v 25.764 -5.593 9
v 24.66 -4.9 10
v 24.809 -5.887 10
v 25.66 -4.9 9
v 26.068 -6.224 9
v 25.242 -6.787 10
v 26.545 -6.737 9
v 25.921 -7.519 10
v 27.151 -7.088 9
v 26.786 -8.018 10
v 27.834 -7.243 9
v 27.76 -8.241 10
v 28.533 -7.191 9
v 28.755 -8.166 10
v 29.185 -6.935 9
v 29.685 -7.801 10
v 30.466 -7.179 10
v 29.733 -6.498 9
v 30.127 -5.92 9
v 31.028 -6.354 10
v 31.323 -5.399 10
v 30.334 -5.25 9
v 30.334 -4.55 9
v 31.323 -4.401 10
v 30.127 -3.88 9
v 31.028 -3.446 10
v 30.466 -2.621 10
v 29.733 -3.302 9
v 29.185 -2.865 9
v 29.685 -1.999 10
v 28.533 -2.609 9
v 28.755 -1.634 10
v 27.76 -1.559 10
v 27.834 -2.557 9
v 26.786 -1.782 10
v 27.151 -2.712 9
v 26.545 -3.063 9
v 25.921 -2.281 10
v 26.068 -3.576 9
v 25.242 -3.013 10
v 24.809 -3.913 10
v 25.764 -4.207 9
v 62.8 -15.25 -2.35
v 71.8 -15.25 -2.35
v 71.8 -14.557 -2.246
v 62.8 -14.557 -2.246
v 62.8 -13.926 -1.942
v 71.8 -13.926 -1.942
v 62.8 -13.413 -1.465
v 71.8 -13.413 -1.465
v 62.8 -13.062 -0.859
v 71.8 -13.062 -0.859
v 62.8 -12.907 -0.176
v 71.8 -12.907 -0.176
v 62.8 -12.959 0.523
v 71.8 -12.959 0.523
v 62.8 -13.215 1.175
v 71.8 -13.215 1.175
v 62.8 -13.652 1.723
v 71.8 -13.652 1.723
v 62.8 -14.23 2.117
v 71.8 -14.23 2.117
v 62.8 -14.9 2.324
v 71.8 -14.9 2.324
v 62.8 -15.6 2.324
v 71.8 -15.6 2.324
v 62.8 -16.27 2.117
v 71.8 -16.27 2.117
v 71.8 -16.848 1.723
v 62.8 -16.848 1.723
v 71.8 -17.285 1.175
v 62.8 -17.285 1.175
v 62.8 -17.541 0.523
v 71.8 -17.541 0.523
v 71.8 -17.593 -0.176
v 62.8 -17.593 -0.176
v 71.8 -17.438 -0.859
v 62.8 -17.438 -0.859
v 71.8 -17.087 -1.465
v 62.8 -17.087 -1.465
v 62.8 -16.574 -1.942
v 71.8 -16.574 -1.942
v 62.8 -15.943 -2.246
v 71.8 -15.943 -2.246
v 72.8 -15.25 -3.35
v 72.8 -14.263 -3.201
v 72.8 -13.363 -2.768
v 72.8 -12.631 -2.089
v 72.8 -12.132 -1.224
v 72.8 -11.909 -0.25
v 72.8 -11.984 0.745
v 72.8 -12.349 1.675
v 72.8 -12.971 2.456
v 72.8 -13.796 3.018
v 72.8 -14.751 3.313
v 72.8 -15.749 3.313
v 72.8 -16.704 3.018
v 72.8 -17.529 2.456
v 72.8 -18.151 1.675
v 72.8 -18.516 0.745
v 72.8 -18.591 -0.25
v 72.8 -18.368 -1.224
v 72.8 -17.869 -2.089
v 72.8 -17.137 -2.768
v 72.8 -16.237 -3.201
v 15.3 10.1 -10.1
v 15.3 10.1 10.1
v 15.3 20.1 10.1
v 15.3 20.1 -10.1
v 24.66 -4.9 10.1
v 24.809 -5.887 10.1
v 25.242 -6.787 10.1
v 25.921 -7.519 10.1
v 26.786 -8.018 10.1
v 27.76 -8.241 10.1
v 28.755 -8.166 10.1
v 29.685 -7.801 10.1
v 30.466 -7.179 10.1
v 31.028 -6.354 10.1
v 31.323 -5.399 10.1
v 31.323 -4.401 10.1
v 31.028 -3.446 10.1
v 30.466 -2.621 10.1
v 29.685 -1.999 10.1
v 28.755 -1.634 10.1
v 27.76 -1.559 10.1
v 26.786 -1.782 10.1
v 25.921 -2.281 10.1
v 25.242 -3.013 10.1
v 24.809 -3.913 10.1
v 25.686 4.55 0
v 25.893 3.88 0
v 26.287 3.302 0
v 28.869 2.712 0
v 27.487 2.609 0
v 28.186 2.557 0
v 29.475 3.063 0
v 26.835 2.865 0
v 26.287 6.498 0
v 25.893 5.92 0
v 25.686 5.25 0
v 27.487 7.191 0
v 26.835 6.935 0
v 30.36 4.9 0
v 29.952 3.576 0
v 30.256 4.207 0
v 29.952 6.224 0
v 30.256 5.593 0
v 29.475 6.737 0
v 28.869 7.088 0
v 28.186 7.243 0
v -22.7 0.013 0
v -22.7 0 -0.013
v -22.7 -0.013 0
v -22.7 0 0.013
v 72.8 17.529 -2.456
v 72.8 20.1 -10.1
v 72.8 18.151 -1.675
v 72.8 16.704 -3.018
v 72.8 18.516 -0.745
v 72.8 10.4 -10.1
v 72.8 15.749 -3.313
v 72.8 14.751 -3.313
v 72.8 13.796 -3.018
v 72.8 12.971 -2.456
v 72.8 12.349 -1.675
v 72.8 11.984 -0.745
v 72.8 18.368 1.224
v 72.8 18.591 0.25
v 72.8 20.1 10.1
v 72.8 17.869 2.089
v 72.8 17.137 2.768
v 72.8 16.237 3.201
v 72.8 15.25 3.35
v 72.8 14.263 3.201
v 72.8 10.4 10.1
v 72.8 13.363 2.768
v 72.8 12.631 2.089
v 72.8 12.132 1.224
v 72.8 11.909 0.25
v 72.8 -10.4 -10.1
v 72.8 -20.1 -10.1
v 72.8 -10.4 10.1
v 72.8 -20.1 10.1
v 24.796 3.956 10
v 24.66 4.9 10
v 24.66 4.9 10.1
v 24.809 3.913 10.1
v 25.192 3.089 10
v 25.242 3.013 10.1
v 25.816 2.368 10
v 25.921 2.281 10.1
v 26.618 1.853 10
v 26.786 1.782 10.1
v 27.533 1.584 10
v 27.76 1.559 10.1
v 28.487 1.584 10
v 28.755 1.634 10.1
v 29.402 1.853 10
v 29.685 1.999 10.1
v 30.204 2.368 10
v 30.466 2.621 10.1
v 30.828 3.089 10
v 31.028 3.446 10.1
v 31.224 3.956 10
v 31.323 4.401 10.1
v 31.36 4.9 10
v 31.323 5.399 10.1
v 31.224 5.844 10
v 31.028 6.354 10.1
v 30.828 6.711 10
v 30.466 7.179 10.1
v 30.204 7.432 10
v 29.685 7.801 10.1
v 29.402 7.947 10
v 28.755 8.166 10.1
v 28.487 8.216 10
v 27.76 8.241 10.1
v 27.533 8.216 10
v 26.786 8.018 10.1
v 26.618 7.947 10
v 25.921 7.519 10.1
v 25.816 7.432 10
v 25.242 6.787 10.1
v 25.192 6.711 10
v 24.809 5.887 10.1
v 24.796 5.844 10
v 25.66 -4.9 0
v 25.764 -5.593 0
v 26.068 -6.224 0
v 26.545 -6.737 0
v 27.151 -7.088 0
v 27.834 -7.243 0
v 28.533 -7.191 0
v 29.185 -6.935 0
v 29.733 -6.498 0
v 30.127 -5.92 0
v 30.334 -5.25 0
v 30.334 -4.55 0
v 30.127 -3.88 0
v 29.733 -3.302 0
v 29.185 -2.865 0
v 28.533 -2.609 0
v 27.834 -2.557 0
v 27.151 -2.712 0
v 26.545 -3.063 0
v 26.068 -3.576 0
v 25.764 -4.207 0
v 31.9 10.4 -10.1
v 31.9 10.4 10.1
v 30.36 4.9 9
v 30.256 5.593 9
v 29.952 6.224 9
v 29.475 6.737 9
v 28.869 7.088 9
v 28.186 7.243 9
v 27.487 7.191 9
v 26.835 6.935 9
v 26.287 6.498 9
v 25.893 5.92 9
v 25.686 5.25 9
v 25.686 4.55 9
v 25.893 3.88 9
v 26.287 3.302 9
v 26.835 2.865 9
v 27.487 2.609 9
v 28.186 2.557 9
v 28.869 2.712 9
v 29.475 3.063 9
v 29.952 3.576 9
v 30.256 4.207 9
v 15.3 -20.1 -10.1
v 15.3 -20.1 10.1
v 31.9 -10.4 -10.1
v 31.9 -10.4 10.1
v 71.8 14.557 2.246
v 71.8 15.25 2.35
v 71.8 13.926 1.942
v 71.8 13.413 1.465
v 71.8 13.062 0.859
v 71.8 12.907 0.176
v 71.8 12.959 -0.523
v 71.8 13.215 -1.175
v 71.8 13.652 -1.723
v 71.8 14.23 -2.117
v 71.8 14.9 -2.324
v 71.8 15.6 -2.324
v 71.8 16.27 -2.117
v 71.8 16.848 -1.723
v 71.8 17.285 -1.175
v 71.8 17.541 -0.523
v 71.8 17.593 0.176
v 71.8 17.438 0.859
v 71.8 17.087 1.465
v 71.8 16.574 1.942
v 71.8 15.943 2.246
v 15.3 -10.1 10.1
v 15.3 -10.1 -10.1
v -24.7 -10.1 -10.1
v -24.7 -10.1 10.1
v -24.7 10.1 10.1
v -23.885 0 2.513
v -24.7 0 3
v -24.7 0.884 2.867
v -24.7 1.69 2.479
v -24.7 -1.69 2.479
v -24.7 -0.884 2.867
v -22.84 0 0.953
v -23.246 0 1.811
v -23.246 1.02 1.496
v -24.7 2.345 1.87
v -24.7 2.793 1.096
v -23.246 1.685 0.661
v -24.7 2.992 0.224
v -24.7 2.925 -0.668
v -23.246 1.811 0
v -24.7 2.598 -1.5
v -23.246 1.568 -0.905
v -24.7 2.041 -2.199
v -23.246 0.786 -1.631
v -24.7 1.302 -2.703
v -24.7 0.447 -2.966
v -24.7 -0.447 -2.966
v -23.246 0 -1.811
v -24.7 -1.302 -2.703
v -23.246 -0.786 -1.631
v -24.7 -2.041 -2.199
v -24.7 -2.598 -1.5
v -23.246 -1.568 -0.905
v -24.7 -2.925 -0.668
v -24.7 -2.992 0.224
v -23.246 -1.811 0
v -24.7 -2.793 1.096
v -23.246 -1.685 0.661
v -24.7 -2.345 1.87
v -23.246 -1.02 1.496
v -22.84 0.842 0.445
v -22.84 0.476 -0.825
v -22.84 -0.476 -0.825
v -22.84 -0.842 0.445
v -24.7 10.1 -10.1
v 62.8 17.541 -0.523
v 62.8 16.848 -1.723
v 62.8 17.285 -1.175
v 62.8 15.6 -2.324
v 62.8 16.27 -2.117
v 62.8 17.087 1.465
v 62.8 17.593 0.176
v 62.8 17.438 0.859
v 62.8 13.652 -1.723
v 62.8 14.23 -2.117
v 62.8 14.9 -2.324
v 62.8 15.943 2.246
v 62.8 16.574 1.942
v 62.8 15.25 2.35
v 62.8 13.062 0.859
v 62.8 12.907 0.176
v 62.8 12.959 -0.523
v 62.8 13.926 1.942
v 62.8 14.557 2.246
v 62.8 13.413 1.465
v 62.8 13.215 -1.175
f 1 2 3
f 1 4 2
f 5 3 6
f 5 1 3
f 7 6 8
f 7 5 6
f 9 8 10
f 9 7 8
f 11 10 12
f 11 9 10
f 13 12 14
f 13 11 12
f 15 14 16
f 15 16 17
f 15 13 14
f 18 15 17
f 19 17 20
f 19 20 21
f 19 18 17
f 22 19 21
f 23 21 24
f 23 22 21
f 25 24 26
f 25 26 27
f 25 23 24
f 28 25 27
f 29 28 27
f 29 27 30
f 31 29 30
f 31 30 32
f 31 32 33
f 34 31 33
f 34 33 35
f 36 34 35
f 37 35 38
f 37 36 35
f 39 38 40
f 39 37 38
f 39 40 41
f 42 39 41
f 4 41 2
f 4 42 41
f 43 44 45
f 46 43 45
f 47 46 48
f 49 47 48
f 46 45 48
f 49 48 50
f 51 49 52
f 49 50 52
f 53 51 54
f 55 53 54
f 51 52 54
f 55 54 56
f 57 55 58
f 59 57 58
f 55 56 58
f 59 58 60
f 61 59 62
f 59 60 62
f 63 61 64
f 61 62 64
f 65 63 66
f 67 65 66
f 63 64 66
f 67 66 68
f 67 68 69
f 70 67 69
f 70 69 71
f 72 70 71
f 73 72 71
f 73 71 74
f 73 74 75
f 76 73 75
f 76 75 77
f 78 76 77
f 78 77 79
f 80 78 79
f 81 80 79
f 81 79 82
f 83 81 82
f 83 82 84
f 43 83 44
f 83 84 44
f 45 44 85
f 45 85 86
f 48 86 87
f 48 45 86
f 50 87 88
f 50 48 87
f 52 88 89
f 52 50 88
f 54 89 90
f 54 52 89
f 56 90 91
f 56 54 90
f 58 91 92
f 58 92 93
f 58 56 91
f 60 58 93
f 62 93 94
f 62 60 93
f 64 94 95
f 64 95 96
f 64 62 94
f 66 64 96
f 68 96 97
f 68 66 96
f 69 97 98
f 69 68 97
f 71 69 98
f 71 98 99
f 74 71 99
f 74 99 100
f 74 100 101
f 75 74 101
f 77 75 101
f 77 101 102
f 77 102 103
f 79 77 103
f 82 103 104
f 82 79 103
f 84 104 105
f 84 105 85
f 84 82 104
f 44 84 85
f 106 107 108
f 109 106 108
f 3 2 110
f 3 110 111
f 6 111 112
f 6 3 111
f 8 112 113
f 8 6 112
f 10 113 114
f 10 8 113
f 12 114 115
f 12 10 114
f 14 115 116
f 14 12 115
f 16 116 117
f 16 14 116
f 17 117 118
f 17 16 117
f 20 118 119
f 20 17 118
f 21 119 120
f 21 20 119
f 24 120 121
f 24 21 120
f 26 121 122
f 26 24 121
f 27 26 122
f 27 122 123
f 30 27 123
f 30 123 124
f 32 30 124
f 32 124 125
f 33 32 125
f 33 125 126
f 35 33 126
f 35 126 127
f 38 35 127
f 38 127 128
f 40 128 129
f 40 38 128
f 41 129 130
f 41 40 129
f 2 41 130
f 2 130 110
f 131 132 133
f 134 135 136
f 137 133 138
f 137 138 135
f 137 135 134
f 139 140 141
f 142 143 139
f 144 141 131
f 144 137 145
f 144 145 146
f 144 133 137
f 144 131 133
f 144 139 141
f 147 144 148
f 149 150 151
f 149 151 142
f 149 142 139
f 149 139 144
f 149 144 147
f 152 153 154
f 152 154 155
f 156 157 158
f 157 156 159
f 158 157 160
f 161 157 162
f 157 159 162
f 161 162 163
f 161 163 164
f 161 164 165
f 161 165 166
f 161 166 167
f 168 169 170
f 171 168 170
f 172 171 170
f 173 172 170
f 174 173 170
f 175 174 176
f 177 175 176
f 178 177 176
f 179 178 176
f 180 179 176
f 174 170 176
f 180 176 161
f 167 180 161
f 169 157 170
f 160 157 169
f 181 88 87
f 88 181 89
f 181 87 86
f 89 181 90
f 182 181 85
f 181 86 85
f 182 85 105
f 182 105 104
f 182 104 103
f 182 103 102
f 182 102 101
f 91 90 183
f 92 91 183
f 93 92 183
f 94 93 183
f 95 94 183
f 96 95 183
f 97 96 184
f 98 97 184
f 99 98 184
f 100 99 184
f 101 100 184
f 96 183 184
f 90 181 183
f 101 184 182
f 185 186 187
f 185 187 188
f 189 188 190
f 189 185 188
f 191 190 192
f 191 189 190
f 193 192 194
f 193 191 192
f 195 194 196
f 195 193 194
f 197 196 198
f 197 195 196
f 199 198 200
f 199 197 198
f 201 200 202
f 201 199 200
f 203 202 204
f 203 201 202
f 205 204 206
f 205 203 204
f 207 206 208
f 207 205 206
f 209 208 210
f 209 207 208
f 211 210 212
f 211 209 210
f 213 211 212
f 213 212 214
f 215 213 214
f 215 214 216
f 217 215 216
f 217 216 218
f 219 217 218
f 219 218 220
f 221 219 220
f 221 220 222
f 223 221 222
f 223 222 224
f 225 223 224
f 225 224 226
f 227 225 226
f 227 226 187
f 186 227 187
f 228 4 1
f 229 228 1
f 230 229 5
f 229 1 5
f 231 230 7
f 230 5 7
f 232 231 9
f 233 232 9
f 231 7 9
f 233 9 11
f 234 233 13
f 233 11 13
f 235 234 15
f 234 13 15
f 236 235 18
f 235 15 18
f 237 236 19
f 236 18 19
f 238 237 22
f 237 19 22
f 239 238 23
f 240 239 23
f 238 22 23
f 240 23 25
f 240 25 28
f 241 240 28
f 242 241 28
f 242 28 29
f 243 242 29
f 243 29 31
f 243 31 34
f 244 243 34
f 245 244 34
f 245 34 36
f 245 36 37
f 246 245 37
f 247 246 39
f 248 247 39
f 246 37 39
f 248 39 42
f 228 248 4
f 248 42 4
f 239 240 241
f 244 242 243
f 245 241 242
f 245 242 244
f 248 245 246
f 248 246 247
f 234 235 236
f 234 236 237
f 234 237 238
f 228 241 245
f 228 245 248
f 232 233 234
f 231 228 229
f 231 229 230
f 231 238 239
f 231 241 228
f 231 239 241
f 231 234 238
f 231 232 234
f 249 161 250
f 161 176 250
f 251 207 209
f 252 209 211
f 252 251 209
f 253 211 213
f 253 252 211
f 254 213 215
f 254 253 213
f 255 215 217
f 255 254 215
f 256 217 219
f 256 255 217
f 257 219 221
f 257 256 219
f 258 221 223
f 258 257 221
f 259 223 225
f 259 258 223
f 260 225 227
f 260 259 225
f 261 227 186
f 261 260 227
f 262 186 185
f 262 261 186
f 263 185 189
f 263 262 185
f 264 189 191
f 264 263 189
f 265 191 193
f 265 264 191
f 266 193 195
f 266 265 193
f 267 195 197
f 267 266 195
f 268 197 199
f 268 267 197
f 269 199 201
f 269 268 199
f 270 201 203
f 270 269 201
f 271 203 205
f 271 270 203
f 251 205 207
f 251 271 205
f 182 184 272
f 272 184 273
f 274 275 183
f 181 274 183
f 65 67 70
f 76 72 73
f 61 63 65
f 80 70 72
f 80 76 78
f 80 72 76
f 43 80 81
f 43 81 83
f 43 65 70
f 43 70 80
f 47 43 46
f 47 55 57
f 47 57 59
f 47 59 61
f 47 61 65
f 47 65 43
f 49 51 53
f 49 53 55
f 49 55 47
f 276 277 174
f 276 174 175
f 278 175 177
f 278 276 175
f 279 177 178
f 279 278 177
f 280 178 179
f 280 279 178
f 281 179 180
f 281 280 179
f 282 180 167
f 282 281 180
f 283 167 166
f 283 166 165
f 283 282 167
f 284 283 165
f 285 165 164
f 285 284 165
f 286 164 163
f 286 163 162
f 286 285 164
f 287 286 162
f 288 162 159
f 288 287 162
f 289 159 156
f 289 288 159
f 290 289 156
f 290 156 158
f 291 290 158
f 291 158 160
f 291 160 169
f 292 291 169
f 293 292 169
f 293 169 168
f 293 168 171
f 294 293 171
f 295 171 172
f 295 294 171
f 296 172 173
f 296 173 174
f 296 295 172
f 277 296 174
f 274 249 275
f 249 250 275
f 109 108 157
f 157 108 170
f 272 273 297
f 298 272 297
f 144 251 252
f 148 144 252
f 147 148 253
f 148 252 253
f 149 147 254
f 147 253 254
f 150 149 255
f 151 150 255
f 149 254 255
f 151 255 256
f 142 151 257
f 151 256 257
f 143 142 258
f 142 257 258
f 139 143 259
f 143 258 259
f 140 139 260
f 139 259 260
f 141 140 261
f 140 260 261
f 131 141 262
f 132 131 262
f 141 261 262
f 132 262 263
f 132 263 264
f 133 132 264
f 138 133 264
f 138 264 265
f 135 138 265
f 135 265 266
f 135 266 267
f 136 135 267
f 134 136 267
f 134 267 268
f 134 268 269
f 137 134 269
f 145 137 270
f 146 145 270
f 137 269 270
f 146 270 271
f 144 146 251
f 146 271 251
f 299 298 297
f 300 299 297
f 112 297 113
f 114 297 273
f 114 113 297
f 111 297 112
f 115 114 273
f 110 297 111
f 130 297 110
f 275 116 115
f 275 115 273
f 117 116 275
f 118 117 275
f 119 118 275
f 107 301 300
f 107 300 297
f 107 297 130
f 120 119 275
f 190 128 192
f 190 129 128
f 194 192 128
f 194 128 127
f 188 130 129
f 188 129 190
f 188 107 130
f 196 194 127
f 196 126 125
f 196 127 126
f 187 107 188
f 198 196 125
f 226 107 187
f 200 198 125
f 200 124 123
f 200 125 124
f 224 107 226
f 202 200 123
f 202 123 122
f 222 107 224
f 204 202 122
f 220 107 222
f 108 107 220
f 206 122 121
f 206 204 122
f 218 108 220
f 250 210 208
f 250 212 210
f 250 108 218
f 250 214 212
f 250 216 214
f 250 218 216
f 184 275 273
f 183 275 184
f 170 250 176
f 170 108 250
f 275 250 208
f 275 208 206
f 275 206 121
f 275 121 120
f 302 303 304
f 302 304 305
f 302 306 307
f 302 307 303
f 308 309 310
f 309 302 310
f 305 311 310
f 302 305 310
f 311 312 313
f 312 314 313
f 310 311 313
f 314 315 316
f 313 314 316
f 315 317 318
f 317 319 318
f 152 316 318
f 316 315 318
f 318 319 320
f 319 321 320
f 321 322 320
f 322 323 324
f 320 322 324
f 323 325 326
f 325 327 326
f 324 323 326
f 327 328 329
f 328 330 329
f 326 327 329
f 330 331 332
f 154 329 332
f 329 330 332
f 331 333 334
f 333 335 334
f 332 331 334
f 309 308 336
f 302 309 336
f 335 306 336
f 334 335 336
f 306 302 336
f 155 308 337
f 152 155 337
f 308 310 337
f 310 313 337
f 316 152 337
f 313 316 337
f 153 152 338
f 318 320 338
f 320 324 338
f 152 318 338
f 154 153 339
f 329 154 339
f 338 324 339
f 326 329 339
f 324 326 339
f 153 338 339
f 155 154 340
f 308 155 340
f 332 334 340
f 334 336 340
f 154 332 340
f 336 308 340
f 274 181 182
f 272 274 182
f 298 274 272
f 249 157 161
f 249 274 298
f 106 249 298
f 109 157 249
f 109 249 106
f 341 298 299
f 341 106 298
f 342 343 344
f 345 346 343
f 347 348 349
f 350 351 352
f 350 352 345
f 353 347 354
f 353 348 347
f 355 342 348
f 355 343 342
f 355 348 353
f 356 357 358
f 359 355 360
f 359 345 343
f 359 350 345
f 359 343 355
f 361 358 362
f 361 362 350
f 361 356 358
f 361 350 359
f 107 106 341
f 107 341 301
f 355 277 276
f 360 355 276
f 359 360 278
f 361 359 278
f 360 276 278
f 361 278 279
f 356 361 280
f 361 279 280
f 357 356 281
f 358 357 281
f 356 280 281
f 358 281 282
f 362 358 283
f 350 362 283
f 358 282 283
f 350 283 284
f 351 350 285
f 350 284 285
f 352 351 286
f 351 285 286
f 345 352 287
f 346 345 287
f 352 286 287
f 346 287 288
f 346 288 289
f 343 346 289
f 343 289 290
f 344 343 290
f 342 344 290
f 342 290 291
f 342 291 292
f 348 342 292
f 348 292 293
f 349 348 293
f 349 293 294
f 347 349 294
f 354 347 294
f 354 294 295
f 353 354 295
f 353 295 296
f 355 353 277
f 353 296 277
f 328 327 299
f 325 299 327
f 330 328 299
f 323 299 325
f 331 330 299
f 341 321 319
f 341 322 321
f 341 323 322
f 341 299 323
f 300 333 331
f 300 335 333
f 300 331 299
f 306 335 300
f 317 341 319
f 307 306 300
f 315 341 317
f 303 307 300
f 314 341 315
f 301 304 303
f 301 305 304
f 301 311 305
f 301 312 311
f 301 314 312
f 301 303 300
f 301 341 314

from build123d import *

# Parameters (mm, degrees)
SKETCH1_W           = 20
SKETCH1_H           = 20
BOSS_EXTRUDE1_DEPTH = 20
SKETCH2_W           = 20
SKETCH2_H           = 40.2
BOSS_EXTRUDE2_DEPTH = 64.7
SKETCH3_W           = 40.9
SKETCH3_H           = 20.8
CUT_EXTRUDE1_DEPTH  = 90.320210479
SKETCH4_W           = 11.9
SKETCH4_H           = 40.2
CUT_EXTRUDE2_DEPTH  = 90.320210479
SKETCH5_R           = 2.35
CUT_EXTRUDE3_DEPTH  = 10
SKETCH6_R           = 2.35
CUT_EXTRUDE4_DEPTH  = 10
CHAMFER1_SIZE       = 1
SKETCH7_W           = 20
SKETCH7_H           = 10.1
BOSS_EXTRUDE4_DEPTH = 4.7
SKETCH9_W           = 20
SKETCH9_H           = 20
BOSS_EXTRUDE5_DEPTH = 24.7
SKETCH10_R          = 3
CUT_EXTRUDE5_DEPTH  = 2
FILLET1_R           = 3.23
SKETCH11_W          = 20.2
SKETCH11_H          = 20.2
SKETCH11_W_2        = 20
SKETCH11_H_2        = 20
BOSS_EXTRUDE6_DEPTH = 40
SKETCH12_R          = 3.35
BOSS_EXTRUDE7_DEPTH = 0.1
BOSS_EXTRUDE8_DEPTH = 0.1


with BuildPart() as part:
    # Sketch1 → Boss-Extrude1 (new body)
    with BuildSketch(Plane(origin=(0, 0, 0), x_dir=(0, 0, -1), z_dir=(1, 0, 0))):
        Rectangle(SKETCH1_W, SKETCH1_H)
    extrude(amount=BOSS_EXTRUDE1_DEPTH)

    # Sketch2 → Boss-Extrude2 (add)
    with BuildSketch(Plane(origin=(20, 0, 0), x_dir=(0, 0, -1), z_dir=(1, 0, 0))):
        Rectangle(SKETCH2_W, SKETCH2_H)
    extrude(amount=BOSS_EXTRUDE2_DEPTH)

    # Sketch3 → Cut-Extrude1 (cut, through all)
    with BuildSketch(Plane.XY.offset(10)):
        with Locations((52.35, 0)):
            Rectangle(SKETCH3_W, SKETCH3_H)
    extrude(amount=-CUT_EXTRUDE1_DEPTH, mode=Mode.SUBTRACT)

    # Sketch4 → Cut-Extrude2 (cut, through all)
    with BuildSketch(Plane.XY.offset(10)):
        with Locations((78.75, 0)):
            Rectangle(SKETCH4_W, SKETCH4_H)
    extrude(amount=-CUT_EXTRUDE2_DEPTH, mode=Mode.SUBTRACT)

    # Sketch5 → Cut-Extrude3 (cut)
    with BuildSketch(Plane.XY.offset(10)):
        with Locations((28.01, 4.9)):
            Circle(SKETCH5_R)
        with Locations(Location((28.01, -4.9, 0), (0, 0, 180))):
            Circle(SKETCH5_R)
    extrude(amount=-CUT_EXTRUDE3_DEPTH, mode=Mode.SUBTRACT)

    # Sketch6 → Cut-Extrude4 (cut)
    with BuildSketch(Plane(origin=(72.8, 0, 0), x_dir=(0, 0, -1), z_dir=(1, 0, 0))):
        with Locations((0, -15.25)):
            Circle(SKETCH6_R)
        with Locations(Location((0, 15.25, 0), (0, 0, 180))):
            Circle(SKETCH6_R)
    extrude(amount=-CUT_EXTRUDE4_DEPTH, mode=Mode.SUBTRACT)

    # Chamfer1
    chamfer1_edges = [part.edges().sort_by_distance(p)[0] for p in [
        (25.66, 4.9, 10),
        (30.36, -4.9, 10),
        (72.8, -15.25, 2.35),
        (72.8, 15.25, -2.35),
    ]]
    chamfer(chamfer1_edges, length=CHAMFER1_SIZE)

    # Sketch7 → Boss-Extrude4 (add)
    with BuildSketch(Plane.ZY.offset(-20)):
        with Locations((0, 15.05)):
            Rectangle(SKETCH7_W, SKETCH7_H)
        with Locations((0, -15.05)):
            Rectangle(SKETCH7_W, SKETCH7_H)
    extrude(amount=BOSS_EXTRUDE4_DEPTH)

    # Sketch9 → Boss-Extrude5 (add)
    with BuildSketch(Plane.ZY):
        Rectangle(SKETCH9_W, SKETCH9_H)
    extrude(amount=BOSS_EXTRUDE5_DEPTH)

    # Sketch10 → Cut-Extrude5 (cut)
    with BuildSketch(Plane.ZY.offset(24.7)):
        Circle(SKETCH10_R)
    extrude(amount=-CUT_EXTRUDE5_DEPTH, mode=Mode.SUBTRACT)

    # Fillet1
    # the kernel refuses this fillet: 3.23 mm, written as the material it adds along each edge
    with BuildSketch(Plane(origin=(-22.7, 0, 0), x_dir=(0, 0, 1), z_dir=(0, -1, 0))) as fillet1_piece_1:
        with BuildLine():
            CenterArc((0.013363095, 3.23), FILLET1_R, 270, 67.616447755)
            Line((0.013363095, 0), (0.013363095, -0.0646))
            Line((0.013363095, -0.0646), (3, -0.0646))
            Line((3, -0.0646), (3.0646, 0))
            ThreePointArc((3.0646, 0), (3.0646, 1), (3.059732738, 1.9754))
            Line((3.059732738, 1.9754), (3, 2))
        make_face()
    revolve(axis=Axis((-22.7, 0, 0), (-1, 0, 0)))

    # Sketch11 → Boss-Extrude6 (add)
    with BuildSketch(Plane.ZY.offset(24.7)):
        Rectangle(SKETCH11_W, SKETCH11_H)
        Rectangle(SKETCH11_W_2, SKETCH11_H_2, mode=Mode.SUBTRACT)
    extrude(amount=-BOSS_EXTRUDE6_DEPTH)

    # Sketch12 → Boss-Extrude7 (add)
    with BuildSketch(Plane.XY.offset(10)):
        Polygon((72.8, 20.1), (15.3, 20.1), (15.3, -20.1), (72.8, -20.1), (72.8, -10.4), (31.9, -10.4), (31.9, 10.4), (72.8, 10.4), align=None)
        with Locations(Location((28.01, 4.9, 0), (0, 0, 180))):
            Circle(SKETCH12_R, mode=Mode.SUBTRACT)
        with Locations(Location((28.01, -4.9, 0), (0, 0, 180))):
            Circle(SKETCH12_R, mode=Mode.SUBTRACT)
    extrude(amount=BOSS_EXTRUDE7_DEPTH)

    # Sketch13 → Boss-Extrude8 (add)
    with BuildSketch(Plane(origin=(0, 0, -10), x_dir=(-1, 0, 0), z_dir=(0, 0, -1))):
        Polygon((-72.8, -20.1), (-15.3, -20.1), (-15.3, 20.1), (-72.8, 20.1), (-72.8, 10.4), (-31.9, 10.4), (-31.9, -10.4), (-72.8, -10.4), align=None)
    extrude(amount=BOSS_EXTRUDE8_DEPTH)


solid = part.part
